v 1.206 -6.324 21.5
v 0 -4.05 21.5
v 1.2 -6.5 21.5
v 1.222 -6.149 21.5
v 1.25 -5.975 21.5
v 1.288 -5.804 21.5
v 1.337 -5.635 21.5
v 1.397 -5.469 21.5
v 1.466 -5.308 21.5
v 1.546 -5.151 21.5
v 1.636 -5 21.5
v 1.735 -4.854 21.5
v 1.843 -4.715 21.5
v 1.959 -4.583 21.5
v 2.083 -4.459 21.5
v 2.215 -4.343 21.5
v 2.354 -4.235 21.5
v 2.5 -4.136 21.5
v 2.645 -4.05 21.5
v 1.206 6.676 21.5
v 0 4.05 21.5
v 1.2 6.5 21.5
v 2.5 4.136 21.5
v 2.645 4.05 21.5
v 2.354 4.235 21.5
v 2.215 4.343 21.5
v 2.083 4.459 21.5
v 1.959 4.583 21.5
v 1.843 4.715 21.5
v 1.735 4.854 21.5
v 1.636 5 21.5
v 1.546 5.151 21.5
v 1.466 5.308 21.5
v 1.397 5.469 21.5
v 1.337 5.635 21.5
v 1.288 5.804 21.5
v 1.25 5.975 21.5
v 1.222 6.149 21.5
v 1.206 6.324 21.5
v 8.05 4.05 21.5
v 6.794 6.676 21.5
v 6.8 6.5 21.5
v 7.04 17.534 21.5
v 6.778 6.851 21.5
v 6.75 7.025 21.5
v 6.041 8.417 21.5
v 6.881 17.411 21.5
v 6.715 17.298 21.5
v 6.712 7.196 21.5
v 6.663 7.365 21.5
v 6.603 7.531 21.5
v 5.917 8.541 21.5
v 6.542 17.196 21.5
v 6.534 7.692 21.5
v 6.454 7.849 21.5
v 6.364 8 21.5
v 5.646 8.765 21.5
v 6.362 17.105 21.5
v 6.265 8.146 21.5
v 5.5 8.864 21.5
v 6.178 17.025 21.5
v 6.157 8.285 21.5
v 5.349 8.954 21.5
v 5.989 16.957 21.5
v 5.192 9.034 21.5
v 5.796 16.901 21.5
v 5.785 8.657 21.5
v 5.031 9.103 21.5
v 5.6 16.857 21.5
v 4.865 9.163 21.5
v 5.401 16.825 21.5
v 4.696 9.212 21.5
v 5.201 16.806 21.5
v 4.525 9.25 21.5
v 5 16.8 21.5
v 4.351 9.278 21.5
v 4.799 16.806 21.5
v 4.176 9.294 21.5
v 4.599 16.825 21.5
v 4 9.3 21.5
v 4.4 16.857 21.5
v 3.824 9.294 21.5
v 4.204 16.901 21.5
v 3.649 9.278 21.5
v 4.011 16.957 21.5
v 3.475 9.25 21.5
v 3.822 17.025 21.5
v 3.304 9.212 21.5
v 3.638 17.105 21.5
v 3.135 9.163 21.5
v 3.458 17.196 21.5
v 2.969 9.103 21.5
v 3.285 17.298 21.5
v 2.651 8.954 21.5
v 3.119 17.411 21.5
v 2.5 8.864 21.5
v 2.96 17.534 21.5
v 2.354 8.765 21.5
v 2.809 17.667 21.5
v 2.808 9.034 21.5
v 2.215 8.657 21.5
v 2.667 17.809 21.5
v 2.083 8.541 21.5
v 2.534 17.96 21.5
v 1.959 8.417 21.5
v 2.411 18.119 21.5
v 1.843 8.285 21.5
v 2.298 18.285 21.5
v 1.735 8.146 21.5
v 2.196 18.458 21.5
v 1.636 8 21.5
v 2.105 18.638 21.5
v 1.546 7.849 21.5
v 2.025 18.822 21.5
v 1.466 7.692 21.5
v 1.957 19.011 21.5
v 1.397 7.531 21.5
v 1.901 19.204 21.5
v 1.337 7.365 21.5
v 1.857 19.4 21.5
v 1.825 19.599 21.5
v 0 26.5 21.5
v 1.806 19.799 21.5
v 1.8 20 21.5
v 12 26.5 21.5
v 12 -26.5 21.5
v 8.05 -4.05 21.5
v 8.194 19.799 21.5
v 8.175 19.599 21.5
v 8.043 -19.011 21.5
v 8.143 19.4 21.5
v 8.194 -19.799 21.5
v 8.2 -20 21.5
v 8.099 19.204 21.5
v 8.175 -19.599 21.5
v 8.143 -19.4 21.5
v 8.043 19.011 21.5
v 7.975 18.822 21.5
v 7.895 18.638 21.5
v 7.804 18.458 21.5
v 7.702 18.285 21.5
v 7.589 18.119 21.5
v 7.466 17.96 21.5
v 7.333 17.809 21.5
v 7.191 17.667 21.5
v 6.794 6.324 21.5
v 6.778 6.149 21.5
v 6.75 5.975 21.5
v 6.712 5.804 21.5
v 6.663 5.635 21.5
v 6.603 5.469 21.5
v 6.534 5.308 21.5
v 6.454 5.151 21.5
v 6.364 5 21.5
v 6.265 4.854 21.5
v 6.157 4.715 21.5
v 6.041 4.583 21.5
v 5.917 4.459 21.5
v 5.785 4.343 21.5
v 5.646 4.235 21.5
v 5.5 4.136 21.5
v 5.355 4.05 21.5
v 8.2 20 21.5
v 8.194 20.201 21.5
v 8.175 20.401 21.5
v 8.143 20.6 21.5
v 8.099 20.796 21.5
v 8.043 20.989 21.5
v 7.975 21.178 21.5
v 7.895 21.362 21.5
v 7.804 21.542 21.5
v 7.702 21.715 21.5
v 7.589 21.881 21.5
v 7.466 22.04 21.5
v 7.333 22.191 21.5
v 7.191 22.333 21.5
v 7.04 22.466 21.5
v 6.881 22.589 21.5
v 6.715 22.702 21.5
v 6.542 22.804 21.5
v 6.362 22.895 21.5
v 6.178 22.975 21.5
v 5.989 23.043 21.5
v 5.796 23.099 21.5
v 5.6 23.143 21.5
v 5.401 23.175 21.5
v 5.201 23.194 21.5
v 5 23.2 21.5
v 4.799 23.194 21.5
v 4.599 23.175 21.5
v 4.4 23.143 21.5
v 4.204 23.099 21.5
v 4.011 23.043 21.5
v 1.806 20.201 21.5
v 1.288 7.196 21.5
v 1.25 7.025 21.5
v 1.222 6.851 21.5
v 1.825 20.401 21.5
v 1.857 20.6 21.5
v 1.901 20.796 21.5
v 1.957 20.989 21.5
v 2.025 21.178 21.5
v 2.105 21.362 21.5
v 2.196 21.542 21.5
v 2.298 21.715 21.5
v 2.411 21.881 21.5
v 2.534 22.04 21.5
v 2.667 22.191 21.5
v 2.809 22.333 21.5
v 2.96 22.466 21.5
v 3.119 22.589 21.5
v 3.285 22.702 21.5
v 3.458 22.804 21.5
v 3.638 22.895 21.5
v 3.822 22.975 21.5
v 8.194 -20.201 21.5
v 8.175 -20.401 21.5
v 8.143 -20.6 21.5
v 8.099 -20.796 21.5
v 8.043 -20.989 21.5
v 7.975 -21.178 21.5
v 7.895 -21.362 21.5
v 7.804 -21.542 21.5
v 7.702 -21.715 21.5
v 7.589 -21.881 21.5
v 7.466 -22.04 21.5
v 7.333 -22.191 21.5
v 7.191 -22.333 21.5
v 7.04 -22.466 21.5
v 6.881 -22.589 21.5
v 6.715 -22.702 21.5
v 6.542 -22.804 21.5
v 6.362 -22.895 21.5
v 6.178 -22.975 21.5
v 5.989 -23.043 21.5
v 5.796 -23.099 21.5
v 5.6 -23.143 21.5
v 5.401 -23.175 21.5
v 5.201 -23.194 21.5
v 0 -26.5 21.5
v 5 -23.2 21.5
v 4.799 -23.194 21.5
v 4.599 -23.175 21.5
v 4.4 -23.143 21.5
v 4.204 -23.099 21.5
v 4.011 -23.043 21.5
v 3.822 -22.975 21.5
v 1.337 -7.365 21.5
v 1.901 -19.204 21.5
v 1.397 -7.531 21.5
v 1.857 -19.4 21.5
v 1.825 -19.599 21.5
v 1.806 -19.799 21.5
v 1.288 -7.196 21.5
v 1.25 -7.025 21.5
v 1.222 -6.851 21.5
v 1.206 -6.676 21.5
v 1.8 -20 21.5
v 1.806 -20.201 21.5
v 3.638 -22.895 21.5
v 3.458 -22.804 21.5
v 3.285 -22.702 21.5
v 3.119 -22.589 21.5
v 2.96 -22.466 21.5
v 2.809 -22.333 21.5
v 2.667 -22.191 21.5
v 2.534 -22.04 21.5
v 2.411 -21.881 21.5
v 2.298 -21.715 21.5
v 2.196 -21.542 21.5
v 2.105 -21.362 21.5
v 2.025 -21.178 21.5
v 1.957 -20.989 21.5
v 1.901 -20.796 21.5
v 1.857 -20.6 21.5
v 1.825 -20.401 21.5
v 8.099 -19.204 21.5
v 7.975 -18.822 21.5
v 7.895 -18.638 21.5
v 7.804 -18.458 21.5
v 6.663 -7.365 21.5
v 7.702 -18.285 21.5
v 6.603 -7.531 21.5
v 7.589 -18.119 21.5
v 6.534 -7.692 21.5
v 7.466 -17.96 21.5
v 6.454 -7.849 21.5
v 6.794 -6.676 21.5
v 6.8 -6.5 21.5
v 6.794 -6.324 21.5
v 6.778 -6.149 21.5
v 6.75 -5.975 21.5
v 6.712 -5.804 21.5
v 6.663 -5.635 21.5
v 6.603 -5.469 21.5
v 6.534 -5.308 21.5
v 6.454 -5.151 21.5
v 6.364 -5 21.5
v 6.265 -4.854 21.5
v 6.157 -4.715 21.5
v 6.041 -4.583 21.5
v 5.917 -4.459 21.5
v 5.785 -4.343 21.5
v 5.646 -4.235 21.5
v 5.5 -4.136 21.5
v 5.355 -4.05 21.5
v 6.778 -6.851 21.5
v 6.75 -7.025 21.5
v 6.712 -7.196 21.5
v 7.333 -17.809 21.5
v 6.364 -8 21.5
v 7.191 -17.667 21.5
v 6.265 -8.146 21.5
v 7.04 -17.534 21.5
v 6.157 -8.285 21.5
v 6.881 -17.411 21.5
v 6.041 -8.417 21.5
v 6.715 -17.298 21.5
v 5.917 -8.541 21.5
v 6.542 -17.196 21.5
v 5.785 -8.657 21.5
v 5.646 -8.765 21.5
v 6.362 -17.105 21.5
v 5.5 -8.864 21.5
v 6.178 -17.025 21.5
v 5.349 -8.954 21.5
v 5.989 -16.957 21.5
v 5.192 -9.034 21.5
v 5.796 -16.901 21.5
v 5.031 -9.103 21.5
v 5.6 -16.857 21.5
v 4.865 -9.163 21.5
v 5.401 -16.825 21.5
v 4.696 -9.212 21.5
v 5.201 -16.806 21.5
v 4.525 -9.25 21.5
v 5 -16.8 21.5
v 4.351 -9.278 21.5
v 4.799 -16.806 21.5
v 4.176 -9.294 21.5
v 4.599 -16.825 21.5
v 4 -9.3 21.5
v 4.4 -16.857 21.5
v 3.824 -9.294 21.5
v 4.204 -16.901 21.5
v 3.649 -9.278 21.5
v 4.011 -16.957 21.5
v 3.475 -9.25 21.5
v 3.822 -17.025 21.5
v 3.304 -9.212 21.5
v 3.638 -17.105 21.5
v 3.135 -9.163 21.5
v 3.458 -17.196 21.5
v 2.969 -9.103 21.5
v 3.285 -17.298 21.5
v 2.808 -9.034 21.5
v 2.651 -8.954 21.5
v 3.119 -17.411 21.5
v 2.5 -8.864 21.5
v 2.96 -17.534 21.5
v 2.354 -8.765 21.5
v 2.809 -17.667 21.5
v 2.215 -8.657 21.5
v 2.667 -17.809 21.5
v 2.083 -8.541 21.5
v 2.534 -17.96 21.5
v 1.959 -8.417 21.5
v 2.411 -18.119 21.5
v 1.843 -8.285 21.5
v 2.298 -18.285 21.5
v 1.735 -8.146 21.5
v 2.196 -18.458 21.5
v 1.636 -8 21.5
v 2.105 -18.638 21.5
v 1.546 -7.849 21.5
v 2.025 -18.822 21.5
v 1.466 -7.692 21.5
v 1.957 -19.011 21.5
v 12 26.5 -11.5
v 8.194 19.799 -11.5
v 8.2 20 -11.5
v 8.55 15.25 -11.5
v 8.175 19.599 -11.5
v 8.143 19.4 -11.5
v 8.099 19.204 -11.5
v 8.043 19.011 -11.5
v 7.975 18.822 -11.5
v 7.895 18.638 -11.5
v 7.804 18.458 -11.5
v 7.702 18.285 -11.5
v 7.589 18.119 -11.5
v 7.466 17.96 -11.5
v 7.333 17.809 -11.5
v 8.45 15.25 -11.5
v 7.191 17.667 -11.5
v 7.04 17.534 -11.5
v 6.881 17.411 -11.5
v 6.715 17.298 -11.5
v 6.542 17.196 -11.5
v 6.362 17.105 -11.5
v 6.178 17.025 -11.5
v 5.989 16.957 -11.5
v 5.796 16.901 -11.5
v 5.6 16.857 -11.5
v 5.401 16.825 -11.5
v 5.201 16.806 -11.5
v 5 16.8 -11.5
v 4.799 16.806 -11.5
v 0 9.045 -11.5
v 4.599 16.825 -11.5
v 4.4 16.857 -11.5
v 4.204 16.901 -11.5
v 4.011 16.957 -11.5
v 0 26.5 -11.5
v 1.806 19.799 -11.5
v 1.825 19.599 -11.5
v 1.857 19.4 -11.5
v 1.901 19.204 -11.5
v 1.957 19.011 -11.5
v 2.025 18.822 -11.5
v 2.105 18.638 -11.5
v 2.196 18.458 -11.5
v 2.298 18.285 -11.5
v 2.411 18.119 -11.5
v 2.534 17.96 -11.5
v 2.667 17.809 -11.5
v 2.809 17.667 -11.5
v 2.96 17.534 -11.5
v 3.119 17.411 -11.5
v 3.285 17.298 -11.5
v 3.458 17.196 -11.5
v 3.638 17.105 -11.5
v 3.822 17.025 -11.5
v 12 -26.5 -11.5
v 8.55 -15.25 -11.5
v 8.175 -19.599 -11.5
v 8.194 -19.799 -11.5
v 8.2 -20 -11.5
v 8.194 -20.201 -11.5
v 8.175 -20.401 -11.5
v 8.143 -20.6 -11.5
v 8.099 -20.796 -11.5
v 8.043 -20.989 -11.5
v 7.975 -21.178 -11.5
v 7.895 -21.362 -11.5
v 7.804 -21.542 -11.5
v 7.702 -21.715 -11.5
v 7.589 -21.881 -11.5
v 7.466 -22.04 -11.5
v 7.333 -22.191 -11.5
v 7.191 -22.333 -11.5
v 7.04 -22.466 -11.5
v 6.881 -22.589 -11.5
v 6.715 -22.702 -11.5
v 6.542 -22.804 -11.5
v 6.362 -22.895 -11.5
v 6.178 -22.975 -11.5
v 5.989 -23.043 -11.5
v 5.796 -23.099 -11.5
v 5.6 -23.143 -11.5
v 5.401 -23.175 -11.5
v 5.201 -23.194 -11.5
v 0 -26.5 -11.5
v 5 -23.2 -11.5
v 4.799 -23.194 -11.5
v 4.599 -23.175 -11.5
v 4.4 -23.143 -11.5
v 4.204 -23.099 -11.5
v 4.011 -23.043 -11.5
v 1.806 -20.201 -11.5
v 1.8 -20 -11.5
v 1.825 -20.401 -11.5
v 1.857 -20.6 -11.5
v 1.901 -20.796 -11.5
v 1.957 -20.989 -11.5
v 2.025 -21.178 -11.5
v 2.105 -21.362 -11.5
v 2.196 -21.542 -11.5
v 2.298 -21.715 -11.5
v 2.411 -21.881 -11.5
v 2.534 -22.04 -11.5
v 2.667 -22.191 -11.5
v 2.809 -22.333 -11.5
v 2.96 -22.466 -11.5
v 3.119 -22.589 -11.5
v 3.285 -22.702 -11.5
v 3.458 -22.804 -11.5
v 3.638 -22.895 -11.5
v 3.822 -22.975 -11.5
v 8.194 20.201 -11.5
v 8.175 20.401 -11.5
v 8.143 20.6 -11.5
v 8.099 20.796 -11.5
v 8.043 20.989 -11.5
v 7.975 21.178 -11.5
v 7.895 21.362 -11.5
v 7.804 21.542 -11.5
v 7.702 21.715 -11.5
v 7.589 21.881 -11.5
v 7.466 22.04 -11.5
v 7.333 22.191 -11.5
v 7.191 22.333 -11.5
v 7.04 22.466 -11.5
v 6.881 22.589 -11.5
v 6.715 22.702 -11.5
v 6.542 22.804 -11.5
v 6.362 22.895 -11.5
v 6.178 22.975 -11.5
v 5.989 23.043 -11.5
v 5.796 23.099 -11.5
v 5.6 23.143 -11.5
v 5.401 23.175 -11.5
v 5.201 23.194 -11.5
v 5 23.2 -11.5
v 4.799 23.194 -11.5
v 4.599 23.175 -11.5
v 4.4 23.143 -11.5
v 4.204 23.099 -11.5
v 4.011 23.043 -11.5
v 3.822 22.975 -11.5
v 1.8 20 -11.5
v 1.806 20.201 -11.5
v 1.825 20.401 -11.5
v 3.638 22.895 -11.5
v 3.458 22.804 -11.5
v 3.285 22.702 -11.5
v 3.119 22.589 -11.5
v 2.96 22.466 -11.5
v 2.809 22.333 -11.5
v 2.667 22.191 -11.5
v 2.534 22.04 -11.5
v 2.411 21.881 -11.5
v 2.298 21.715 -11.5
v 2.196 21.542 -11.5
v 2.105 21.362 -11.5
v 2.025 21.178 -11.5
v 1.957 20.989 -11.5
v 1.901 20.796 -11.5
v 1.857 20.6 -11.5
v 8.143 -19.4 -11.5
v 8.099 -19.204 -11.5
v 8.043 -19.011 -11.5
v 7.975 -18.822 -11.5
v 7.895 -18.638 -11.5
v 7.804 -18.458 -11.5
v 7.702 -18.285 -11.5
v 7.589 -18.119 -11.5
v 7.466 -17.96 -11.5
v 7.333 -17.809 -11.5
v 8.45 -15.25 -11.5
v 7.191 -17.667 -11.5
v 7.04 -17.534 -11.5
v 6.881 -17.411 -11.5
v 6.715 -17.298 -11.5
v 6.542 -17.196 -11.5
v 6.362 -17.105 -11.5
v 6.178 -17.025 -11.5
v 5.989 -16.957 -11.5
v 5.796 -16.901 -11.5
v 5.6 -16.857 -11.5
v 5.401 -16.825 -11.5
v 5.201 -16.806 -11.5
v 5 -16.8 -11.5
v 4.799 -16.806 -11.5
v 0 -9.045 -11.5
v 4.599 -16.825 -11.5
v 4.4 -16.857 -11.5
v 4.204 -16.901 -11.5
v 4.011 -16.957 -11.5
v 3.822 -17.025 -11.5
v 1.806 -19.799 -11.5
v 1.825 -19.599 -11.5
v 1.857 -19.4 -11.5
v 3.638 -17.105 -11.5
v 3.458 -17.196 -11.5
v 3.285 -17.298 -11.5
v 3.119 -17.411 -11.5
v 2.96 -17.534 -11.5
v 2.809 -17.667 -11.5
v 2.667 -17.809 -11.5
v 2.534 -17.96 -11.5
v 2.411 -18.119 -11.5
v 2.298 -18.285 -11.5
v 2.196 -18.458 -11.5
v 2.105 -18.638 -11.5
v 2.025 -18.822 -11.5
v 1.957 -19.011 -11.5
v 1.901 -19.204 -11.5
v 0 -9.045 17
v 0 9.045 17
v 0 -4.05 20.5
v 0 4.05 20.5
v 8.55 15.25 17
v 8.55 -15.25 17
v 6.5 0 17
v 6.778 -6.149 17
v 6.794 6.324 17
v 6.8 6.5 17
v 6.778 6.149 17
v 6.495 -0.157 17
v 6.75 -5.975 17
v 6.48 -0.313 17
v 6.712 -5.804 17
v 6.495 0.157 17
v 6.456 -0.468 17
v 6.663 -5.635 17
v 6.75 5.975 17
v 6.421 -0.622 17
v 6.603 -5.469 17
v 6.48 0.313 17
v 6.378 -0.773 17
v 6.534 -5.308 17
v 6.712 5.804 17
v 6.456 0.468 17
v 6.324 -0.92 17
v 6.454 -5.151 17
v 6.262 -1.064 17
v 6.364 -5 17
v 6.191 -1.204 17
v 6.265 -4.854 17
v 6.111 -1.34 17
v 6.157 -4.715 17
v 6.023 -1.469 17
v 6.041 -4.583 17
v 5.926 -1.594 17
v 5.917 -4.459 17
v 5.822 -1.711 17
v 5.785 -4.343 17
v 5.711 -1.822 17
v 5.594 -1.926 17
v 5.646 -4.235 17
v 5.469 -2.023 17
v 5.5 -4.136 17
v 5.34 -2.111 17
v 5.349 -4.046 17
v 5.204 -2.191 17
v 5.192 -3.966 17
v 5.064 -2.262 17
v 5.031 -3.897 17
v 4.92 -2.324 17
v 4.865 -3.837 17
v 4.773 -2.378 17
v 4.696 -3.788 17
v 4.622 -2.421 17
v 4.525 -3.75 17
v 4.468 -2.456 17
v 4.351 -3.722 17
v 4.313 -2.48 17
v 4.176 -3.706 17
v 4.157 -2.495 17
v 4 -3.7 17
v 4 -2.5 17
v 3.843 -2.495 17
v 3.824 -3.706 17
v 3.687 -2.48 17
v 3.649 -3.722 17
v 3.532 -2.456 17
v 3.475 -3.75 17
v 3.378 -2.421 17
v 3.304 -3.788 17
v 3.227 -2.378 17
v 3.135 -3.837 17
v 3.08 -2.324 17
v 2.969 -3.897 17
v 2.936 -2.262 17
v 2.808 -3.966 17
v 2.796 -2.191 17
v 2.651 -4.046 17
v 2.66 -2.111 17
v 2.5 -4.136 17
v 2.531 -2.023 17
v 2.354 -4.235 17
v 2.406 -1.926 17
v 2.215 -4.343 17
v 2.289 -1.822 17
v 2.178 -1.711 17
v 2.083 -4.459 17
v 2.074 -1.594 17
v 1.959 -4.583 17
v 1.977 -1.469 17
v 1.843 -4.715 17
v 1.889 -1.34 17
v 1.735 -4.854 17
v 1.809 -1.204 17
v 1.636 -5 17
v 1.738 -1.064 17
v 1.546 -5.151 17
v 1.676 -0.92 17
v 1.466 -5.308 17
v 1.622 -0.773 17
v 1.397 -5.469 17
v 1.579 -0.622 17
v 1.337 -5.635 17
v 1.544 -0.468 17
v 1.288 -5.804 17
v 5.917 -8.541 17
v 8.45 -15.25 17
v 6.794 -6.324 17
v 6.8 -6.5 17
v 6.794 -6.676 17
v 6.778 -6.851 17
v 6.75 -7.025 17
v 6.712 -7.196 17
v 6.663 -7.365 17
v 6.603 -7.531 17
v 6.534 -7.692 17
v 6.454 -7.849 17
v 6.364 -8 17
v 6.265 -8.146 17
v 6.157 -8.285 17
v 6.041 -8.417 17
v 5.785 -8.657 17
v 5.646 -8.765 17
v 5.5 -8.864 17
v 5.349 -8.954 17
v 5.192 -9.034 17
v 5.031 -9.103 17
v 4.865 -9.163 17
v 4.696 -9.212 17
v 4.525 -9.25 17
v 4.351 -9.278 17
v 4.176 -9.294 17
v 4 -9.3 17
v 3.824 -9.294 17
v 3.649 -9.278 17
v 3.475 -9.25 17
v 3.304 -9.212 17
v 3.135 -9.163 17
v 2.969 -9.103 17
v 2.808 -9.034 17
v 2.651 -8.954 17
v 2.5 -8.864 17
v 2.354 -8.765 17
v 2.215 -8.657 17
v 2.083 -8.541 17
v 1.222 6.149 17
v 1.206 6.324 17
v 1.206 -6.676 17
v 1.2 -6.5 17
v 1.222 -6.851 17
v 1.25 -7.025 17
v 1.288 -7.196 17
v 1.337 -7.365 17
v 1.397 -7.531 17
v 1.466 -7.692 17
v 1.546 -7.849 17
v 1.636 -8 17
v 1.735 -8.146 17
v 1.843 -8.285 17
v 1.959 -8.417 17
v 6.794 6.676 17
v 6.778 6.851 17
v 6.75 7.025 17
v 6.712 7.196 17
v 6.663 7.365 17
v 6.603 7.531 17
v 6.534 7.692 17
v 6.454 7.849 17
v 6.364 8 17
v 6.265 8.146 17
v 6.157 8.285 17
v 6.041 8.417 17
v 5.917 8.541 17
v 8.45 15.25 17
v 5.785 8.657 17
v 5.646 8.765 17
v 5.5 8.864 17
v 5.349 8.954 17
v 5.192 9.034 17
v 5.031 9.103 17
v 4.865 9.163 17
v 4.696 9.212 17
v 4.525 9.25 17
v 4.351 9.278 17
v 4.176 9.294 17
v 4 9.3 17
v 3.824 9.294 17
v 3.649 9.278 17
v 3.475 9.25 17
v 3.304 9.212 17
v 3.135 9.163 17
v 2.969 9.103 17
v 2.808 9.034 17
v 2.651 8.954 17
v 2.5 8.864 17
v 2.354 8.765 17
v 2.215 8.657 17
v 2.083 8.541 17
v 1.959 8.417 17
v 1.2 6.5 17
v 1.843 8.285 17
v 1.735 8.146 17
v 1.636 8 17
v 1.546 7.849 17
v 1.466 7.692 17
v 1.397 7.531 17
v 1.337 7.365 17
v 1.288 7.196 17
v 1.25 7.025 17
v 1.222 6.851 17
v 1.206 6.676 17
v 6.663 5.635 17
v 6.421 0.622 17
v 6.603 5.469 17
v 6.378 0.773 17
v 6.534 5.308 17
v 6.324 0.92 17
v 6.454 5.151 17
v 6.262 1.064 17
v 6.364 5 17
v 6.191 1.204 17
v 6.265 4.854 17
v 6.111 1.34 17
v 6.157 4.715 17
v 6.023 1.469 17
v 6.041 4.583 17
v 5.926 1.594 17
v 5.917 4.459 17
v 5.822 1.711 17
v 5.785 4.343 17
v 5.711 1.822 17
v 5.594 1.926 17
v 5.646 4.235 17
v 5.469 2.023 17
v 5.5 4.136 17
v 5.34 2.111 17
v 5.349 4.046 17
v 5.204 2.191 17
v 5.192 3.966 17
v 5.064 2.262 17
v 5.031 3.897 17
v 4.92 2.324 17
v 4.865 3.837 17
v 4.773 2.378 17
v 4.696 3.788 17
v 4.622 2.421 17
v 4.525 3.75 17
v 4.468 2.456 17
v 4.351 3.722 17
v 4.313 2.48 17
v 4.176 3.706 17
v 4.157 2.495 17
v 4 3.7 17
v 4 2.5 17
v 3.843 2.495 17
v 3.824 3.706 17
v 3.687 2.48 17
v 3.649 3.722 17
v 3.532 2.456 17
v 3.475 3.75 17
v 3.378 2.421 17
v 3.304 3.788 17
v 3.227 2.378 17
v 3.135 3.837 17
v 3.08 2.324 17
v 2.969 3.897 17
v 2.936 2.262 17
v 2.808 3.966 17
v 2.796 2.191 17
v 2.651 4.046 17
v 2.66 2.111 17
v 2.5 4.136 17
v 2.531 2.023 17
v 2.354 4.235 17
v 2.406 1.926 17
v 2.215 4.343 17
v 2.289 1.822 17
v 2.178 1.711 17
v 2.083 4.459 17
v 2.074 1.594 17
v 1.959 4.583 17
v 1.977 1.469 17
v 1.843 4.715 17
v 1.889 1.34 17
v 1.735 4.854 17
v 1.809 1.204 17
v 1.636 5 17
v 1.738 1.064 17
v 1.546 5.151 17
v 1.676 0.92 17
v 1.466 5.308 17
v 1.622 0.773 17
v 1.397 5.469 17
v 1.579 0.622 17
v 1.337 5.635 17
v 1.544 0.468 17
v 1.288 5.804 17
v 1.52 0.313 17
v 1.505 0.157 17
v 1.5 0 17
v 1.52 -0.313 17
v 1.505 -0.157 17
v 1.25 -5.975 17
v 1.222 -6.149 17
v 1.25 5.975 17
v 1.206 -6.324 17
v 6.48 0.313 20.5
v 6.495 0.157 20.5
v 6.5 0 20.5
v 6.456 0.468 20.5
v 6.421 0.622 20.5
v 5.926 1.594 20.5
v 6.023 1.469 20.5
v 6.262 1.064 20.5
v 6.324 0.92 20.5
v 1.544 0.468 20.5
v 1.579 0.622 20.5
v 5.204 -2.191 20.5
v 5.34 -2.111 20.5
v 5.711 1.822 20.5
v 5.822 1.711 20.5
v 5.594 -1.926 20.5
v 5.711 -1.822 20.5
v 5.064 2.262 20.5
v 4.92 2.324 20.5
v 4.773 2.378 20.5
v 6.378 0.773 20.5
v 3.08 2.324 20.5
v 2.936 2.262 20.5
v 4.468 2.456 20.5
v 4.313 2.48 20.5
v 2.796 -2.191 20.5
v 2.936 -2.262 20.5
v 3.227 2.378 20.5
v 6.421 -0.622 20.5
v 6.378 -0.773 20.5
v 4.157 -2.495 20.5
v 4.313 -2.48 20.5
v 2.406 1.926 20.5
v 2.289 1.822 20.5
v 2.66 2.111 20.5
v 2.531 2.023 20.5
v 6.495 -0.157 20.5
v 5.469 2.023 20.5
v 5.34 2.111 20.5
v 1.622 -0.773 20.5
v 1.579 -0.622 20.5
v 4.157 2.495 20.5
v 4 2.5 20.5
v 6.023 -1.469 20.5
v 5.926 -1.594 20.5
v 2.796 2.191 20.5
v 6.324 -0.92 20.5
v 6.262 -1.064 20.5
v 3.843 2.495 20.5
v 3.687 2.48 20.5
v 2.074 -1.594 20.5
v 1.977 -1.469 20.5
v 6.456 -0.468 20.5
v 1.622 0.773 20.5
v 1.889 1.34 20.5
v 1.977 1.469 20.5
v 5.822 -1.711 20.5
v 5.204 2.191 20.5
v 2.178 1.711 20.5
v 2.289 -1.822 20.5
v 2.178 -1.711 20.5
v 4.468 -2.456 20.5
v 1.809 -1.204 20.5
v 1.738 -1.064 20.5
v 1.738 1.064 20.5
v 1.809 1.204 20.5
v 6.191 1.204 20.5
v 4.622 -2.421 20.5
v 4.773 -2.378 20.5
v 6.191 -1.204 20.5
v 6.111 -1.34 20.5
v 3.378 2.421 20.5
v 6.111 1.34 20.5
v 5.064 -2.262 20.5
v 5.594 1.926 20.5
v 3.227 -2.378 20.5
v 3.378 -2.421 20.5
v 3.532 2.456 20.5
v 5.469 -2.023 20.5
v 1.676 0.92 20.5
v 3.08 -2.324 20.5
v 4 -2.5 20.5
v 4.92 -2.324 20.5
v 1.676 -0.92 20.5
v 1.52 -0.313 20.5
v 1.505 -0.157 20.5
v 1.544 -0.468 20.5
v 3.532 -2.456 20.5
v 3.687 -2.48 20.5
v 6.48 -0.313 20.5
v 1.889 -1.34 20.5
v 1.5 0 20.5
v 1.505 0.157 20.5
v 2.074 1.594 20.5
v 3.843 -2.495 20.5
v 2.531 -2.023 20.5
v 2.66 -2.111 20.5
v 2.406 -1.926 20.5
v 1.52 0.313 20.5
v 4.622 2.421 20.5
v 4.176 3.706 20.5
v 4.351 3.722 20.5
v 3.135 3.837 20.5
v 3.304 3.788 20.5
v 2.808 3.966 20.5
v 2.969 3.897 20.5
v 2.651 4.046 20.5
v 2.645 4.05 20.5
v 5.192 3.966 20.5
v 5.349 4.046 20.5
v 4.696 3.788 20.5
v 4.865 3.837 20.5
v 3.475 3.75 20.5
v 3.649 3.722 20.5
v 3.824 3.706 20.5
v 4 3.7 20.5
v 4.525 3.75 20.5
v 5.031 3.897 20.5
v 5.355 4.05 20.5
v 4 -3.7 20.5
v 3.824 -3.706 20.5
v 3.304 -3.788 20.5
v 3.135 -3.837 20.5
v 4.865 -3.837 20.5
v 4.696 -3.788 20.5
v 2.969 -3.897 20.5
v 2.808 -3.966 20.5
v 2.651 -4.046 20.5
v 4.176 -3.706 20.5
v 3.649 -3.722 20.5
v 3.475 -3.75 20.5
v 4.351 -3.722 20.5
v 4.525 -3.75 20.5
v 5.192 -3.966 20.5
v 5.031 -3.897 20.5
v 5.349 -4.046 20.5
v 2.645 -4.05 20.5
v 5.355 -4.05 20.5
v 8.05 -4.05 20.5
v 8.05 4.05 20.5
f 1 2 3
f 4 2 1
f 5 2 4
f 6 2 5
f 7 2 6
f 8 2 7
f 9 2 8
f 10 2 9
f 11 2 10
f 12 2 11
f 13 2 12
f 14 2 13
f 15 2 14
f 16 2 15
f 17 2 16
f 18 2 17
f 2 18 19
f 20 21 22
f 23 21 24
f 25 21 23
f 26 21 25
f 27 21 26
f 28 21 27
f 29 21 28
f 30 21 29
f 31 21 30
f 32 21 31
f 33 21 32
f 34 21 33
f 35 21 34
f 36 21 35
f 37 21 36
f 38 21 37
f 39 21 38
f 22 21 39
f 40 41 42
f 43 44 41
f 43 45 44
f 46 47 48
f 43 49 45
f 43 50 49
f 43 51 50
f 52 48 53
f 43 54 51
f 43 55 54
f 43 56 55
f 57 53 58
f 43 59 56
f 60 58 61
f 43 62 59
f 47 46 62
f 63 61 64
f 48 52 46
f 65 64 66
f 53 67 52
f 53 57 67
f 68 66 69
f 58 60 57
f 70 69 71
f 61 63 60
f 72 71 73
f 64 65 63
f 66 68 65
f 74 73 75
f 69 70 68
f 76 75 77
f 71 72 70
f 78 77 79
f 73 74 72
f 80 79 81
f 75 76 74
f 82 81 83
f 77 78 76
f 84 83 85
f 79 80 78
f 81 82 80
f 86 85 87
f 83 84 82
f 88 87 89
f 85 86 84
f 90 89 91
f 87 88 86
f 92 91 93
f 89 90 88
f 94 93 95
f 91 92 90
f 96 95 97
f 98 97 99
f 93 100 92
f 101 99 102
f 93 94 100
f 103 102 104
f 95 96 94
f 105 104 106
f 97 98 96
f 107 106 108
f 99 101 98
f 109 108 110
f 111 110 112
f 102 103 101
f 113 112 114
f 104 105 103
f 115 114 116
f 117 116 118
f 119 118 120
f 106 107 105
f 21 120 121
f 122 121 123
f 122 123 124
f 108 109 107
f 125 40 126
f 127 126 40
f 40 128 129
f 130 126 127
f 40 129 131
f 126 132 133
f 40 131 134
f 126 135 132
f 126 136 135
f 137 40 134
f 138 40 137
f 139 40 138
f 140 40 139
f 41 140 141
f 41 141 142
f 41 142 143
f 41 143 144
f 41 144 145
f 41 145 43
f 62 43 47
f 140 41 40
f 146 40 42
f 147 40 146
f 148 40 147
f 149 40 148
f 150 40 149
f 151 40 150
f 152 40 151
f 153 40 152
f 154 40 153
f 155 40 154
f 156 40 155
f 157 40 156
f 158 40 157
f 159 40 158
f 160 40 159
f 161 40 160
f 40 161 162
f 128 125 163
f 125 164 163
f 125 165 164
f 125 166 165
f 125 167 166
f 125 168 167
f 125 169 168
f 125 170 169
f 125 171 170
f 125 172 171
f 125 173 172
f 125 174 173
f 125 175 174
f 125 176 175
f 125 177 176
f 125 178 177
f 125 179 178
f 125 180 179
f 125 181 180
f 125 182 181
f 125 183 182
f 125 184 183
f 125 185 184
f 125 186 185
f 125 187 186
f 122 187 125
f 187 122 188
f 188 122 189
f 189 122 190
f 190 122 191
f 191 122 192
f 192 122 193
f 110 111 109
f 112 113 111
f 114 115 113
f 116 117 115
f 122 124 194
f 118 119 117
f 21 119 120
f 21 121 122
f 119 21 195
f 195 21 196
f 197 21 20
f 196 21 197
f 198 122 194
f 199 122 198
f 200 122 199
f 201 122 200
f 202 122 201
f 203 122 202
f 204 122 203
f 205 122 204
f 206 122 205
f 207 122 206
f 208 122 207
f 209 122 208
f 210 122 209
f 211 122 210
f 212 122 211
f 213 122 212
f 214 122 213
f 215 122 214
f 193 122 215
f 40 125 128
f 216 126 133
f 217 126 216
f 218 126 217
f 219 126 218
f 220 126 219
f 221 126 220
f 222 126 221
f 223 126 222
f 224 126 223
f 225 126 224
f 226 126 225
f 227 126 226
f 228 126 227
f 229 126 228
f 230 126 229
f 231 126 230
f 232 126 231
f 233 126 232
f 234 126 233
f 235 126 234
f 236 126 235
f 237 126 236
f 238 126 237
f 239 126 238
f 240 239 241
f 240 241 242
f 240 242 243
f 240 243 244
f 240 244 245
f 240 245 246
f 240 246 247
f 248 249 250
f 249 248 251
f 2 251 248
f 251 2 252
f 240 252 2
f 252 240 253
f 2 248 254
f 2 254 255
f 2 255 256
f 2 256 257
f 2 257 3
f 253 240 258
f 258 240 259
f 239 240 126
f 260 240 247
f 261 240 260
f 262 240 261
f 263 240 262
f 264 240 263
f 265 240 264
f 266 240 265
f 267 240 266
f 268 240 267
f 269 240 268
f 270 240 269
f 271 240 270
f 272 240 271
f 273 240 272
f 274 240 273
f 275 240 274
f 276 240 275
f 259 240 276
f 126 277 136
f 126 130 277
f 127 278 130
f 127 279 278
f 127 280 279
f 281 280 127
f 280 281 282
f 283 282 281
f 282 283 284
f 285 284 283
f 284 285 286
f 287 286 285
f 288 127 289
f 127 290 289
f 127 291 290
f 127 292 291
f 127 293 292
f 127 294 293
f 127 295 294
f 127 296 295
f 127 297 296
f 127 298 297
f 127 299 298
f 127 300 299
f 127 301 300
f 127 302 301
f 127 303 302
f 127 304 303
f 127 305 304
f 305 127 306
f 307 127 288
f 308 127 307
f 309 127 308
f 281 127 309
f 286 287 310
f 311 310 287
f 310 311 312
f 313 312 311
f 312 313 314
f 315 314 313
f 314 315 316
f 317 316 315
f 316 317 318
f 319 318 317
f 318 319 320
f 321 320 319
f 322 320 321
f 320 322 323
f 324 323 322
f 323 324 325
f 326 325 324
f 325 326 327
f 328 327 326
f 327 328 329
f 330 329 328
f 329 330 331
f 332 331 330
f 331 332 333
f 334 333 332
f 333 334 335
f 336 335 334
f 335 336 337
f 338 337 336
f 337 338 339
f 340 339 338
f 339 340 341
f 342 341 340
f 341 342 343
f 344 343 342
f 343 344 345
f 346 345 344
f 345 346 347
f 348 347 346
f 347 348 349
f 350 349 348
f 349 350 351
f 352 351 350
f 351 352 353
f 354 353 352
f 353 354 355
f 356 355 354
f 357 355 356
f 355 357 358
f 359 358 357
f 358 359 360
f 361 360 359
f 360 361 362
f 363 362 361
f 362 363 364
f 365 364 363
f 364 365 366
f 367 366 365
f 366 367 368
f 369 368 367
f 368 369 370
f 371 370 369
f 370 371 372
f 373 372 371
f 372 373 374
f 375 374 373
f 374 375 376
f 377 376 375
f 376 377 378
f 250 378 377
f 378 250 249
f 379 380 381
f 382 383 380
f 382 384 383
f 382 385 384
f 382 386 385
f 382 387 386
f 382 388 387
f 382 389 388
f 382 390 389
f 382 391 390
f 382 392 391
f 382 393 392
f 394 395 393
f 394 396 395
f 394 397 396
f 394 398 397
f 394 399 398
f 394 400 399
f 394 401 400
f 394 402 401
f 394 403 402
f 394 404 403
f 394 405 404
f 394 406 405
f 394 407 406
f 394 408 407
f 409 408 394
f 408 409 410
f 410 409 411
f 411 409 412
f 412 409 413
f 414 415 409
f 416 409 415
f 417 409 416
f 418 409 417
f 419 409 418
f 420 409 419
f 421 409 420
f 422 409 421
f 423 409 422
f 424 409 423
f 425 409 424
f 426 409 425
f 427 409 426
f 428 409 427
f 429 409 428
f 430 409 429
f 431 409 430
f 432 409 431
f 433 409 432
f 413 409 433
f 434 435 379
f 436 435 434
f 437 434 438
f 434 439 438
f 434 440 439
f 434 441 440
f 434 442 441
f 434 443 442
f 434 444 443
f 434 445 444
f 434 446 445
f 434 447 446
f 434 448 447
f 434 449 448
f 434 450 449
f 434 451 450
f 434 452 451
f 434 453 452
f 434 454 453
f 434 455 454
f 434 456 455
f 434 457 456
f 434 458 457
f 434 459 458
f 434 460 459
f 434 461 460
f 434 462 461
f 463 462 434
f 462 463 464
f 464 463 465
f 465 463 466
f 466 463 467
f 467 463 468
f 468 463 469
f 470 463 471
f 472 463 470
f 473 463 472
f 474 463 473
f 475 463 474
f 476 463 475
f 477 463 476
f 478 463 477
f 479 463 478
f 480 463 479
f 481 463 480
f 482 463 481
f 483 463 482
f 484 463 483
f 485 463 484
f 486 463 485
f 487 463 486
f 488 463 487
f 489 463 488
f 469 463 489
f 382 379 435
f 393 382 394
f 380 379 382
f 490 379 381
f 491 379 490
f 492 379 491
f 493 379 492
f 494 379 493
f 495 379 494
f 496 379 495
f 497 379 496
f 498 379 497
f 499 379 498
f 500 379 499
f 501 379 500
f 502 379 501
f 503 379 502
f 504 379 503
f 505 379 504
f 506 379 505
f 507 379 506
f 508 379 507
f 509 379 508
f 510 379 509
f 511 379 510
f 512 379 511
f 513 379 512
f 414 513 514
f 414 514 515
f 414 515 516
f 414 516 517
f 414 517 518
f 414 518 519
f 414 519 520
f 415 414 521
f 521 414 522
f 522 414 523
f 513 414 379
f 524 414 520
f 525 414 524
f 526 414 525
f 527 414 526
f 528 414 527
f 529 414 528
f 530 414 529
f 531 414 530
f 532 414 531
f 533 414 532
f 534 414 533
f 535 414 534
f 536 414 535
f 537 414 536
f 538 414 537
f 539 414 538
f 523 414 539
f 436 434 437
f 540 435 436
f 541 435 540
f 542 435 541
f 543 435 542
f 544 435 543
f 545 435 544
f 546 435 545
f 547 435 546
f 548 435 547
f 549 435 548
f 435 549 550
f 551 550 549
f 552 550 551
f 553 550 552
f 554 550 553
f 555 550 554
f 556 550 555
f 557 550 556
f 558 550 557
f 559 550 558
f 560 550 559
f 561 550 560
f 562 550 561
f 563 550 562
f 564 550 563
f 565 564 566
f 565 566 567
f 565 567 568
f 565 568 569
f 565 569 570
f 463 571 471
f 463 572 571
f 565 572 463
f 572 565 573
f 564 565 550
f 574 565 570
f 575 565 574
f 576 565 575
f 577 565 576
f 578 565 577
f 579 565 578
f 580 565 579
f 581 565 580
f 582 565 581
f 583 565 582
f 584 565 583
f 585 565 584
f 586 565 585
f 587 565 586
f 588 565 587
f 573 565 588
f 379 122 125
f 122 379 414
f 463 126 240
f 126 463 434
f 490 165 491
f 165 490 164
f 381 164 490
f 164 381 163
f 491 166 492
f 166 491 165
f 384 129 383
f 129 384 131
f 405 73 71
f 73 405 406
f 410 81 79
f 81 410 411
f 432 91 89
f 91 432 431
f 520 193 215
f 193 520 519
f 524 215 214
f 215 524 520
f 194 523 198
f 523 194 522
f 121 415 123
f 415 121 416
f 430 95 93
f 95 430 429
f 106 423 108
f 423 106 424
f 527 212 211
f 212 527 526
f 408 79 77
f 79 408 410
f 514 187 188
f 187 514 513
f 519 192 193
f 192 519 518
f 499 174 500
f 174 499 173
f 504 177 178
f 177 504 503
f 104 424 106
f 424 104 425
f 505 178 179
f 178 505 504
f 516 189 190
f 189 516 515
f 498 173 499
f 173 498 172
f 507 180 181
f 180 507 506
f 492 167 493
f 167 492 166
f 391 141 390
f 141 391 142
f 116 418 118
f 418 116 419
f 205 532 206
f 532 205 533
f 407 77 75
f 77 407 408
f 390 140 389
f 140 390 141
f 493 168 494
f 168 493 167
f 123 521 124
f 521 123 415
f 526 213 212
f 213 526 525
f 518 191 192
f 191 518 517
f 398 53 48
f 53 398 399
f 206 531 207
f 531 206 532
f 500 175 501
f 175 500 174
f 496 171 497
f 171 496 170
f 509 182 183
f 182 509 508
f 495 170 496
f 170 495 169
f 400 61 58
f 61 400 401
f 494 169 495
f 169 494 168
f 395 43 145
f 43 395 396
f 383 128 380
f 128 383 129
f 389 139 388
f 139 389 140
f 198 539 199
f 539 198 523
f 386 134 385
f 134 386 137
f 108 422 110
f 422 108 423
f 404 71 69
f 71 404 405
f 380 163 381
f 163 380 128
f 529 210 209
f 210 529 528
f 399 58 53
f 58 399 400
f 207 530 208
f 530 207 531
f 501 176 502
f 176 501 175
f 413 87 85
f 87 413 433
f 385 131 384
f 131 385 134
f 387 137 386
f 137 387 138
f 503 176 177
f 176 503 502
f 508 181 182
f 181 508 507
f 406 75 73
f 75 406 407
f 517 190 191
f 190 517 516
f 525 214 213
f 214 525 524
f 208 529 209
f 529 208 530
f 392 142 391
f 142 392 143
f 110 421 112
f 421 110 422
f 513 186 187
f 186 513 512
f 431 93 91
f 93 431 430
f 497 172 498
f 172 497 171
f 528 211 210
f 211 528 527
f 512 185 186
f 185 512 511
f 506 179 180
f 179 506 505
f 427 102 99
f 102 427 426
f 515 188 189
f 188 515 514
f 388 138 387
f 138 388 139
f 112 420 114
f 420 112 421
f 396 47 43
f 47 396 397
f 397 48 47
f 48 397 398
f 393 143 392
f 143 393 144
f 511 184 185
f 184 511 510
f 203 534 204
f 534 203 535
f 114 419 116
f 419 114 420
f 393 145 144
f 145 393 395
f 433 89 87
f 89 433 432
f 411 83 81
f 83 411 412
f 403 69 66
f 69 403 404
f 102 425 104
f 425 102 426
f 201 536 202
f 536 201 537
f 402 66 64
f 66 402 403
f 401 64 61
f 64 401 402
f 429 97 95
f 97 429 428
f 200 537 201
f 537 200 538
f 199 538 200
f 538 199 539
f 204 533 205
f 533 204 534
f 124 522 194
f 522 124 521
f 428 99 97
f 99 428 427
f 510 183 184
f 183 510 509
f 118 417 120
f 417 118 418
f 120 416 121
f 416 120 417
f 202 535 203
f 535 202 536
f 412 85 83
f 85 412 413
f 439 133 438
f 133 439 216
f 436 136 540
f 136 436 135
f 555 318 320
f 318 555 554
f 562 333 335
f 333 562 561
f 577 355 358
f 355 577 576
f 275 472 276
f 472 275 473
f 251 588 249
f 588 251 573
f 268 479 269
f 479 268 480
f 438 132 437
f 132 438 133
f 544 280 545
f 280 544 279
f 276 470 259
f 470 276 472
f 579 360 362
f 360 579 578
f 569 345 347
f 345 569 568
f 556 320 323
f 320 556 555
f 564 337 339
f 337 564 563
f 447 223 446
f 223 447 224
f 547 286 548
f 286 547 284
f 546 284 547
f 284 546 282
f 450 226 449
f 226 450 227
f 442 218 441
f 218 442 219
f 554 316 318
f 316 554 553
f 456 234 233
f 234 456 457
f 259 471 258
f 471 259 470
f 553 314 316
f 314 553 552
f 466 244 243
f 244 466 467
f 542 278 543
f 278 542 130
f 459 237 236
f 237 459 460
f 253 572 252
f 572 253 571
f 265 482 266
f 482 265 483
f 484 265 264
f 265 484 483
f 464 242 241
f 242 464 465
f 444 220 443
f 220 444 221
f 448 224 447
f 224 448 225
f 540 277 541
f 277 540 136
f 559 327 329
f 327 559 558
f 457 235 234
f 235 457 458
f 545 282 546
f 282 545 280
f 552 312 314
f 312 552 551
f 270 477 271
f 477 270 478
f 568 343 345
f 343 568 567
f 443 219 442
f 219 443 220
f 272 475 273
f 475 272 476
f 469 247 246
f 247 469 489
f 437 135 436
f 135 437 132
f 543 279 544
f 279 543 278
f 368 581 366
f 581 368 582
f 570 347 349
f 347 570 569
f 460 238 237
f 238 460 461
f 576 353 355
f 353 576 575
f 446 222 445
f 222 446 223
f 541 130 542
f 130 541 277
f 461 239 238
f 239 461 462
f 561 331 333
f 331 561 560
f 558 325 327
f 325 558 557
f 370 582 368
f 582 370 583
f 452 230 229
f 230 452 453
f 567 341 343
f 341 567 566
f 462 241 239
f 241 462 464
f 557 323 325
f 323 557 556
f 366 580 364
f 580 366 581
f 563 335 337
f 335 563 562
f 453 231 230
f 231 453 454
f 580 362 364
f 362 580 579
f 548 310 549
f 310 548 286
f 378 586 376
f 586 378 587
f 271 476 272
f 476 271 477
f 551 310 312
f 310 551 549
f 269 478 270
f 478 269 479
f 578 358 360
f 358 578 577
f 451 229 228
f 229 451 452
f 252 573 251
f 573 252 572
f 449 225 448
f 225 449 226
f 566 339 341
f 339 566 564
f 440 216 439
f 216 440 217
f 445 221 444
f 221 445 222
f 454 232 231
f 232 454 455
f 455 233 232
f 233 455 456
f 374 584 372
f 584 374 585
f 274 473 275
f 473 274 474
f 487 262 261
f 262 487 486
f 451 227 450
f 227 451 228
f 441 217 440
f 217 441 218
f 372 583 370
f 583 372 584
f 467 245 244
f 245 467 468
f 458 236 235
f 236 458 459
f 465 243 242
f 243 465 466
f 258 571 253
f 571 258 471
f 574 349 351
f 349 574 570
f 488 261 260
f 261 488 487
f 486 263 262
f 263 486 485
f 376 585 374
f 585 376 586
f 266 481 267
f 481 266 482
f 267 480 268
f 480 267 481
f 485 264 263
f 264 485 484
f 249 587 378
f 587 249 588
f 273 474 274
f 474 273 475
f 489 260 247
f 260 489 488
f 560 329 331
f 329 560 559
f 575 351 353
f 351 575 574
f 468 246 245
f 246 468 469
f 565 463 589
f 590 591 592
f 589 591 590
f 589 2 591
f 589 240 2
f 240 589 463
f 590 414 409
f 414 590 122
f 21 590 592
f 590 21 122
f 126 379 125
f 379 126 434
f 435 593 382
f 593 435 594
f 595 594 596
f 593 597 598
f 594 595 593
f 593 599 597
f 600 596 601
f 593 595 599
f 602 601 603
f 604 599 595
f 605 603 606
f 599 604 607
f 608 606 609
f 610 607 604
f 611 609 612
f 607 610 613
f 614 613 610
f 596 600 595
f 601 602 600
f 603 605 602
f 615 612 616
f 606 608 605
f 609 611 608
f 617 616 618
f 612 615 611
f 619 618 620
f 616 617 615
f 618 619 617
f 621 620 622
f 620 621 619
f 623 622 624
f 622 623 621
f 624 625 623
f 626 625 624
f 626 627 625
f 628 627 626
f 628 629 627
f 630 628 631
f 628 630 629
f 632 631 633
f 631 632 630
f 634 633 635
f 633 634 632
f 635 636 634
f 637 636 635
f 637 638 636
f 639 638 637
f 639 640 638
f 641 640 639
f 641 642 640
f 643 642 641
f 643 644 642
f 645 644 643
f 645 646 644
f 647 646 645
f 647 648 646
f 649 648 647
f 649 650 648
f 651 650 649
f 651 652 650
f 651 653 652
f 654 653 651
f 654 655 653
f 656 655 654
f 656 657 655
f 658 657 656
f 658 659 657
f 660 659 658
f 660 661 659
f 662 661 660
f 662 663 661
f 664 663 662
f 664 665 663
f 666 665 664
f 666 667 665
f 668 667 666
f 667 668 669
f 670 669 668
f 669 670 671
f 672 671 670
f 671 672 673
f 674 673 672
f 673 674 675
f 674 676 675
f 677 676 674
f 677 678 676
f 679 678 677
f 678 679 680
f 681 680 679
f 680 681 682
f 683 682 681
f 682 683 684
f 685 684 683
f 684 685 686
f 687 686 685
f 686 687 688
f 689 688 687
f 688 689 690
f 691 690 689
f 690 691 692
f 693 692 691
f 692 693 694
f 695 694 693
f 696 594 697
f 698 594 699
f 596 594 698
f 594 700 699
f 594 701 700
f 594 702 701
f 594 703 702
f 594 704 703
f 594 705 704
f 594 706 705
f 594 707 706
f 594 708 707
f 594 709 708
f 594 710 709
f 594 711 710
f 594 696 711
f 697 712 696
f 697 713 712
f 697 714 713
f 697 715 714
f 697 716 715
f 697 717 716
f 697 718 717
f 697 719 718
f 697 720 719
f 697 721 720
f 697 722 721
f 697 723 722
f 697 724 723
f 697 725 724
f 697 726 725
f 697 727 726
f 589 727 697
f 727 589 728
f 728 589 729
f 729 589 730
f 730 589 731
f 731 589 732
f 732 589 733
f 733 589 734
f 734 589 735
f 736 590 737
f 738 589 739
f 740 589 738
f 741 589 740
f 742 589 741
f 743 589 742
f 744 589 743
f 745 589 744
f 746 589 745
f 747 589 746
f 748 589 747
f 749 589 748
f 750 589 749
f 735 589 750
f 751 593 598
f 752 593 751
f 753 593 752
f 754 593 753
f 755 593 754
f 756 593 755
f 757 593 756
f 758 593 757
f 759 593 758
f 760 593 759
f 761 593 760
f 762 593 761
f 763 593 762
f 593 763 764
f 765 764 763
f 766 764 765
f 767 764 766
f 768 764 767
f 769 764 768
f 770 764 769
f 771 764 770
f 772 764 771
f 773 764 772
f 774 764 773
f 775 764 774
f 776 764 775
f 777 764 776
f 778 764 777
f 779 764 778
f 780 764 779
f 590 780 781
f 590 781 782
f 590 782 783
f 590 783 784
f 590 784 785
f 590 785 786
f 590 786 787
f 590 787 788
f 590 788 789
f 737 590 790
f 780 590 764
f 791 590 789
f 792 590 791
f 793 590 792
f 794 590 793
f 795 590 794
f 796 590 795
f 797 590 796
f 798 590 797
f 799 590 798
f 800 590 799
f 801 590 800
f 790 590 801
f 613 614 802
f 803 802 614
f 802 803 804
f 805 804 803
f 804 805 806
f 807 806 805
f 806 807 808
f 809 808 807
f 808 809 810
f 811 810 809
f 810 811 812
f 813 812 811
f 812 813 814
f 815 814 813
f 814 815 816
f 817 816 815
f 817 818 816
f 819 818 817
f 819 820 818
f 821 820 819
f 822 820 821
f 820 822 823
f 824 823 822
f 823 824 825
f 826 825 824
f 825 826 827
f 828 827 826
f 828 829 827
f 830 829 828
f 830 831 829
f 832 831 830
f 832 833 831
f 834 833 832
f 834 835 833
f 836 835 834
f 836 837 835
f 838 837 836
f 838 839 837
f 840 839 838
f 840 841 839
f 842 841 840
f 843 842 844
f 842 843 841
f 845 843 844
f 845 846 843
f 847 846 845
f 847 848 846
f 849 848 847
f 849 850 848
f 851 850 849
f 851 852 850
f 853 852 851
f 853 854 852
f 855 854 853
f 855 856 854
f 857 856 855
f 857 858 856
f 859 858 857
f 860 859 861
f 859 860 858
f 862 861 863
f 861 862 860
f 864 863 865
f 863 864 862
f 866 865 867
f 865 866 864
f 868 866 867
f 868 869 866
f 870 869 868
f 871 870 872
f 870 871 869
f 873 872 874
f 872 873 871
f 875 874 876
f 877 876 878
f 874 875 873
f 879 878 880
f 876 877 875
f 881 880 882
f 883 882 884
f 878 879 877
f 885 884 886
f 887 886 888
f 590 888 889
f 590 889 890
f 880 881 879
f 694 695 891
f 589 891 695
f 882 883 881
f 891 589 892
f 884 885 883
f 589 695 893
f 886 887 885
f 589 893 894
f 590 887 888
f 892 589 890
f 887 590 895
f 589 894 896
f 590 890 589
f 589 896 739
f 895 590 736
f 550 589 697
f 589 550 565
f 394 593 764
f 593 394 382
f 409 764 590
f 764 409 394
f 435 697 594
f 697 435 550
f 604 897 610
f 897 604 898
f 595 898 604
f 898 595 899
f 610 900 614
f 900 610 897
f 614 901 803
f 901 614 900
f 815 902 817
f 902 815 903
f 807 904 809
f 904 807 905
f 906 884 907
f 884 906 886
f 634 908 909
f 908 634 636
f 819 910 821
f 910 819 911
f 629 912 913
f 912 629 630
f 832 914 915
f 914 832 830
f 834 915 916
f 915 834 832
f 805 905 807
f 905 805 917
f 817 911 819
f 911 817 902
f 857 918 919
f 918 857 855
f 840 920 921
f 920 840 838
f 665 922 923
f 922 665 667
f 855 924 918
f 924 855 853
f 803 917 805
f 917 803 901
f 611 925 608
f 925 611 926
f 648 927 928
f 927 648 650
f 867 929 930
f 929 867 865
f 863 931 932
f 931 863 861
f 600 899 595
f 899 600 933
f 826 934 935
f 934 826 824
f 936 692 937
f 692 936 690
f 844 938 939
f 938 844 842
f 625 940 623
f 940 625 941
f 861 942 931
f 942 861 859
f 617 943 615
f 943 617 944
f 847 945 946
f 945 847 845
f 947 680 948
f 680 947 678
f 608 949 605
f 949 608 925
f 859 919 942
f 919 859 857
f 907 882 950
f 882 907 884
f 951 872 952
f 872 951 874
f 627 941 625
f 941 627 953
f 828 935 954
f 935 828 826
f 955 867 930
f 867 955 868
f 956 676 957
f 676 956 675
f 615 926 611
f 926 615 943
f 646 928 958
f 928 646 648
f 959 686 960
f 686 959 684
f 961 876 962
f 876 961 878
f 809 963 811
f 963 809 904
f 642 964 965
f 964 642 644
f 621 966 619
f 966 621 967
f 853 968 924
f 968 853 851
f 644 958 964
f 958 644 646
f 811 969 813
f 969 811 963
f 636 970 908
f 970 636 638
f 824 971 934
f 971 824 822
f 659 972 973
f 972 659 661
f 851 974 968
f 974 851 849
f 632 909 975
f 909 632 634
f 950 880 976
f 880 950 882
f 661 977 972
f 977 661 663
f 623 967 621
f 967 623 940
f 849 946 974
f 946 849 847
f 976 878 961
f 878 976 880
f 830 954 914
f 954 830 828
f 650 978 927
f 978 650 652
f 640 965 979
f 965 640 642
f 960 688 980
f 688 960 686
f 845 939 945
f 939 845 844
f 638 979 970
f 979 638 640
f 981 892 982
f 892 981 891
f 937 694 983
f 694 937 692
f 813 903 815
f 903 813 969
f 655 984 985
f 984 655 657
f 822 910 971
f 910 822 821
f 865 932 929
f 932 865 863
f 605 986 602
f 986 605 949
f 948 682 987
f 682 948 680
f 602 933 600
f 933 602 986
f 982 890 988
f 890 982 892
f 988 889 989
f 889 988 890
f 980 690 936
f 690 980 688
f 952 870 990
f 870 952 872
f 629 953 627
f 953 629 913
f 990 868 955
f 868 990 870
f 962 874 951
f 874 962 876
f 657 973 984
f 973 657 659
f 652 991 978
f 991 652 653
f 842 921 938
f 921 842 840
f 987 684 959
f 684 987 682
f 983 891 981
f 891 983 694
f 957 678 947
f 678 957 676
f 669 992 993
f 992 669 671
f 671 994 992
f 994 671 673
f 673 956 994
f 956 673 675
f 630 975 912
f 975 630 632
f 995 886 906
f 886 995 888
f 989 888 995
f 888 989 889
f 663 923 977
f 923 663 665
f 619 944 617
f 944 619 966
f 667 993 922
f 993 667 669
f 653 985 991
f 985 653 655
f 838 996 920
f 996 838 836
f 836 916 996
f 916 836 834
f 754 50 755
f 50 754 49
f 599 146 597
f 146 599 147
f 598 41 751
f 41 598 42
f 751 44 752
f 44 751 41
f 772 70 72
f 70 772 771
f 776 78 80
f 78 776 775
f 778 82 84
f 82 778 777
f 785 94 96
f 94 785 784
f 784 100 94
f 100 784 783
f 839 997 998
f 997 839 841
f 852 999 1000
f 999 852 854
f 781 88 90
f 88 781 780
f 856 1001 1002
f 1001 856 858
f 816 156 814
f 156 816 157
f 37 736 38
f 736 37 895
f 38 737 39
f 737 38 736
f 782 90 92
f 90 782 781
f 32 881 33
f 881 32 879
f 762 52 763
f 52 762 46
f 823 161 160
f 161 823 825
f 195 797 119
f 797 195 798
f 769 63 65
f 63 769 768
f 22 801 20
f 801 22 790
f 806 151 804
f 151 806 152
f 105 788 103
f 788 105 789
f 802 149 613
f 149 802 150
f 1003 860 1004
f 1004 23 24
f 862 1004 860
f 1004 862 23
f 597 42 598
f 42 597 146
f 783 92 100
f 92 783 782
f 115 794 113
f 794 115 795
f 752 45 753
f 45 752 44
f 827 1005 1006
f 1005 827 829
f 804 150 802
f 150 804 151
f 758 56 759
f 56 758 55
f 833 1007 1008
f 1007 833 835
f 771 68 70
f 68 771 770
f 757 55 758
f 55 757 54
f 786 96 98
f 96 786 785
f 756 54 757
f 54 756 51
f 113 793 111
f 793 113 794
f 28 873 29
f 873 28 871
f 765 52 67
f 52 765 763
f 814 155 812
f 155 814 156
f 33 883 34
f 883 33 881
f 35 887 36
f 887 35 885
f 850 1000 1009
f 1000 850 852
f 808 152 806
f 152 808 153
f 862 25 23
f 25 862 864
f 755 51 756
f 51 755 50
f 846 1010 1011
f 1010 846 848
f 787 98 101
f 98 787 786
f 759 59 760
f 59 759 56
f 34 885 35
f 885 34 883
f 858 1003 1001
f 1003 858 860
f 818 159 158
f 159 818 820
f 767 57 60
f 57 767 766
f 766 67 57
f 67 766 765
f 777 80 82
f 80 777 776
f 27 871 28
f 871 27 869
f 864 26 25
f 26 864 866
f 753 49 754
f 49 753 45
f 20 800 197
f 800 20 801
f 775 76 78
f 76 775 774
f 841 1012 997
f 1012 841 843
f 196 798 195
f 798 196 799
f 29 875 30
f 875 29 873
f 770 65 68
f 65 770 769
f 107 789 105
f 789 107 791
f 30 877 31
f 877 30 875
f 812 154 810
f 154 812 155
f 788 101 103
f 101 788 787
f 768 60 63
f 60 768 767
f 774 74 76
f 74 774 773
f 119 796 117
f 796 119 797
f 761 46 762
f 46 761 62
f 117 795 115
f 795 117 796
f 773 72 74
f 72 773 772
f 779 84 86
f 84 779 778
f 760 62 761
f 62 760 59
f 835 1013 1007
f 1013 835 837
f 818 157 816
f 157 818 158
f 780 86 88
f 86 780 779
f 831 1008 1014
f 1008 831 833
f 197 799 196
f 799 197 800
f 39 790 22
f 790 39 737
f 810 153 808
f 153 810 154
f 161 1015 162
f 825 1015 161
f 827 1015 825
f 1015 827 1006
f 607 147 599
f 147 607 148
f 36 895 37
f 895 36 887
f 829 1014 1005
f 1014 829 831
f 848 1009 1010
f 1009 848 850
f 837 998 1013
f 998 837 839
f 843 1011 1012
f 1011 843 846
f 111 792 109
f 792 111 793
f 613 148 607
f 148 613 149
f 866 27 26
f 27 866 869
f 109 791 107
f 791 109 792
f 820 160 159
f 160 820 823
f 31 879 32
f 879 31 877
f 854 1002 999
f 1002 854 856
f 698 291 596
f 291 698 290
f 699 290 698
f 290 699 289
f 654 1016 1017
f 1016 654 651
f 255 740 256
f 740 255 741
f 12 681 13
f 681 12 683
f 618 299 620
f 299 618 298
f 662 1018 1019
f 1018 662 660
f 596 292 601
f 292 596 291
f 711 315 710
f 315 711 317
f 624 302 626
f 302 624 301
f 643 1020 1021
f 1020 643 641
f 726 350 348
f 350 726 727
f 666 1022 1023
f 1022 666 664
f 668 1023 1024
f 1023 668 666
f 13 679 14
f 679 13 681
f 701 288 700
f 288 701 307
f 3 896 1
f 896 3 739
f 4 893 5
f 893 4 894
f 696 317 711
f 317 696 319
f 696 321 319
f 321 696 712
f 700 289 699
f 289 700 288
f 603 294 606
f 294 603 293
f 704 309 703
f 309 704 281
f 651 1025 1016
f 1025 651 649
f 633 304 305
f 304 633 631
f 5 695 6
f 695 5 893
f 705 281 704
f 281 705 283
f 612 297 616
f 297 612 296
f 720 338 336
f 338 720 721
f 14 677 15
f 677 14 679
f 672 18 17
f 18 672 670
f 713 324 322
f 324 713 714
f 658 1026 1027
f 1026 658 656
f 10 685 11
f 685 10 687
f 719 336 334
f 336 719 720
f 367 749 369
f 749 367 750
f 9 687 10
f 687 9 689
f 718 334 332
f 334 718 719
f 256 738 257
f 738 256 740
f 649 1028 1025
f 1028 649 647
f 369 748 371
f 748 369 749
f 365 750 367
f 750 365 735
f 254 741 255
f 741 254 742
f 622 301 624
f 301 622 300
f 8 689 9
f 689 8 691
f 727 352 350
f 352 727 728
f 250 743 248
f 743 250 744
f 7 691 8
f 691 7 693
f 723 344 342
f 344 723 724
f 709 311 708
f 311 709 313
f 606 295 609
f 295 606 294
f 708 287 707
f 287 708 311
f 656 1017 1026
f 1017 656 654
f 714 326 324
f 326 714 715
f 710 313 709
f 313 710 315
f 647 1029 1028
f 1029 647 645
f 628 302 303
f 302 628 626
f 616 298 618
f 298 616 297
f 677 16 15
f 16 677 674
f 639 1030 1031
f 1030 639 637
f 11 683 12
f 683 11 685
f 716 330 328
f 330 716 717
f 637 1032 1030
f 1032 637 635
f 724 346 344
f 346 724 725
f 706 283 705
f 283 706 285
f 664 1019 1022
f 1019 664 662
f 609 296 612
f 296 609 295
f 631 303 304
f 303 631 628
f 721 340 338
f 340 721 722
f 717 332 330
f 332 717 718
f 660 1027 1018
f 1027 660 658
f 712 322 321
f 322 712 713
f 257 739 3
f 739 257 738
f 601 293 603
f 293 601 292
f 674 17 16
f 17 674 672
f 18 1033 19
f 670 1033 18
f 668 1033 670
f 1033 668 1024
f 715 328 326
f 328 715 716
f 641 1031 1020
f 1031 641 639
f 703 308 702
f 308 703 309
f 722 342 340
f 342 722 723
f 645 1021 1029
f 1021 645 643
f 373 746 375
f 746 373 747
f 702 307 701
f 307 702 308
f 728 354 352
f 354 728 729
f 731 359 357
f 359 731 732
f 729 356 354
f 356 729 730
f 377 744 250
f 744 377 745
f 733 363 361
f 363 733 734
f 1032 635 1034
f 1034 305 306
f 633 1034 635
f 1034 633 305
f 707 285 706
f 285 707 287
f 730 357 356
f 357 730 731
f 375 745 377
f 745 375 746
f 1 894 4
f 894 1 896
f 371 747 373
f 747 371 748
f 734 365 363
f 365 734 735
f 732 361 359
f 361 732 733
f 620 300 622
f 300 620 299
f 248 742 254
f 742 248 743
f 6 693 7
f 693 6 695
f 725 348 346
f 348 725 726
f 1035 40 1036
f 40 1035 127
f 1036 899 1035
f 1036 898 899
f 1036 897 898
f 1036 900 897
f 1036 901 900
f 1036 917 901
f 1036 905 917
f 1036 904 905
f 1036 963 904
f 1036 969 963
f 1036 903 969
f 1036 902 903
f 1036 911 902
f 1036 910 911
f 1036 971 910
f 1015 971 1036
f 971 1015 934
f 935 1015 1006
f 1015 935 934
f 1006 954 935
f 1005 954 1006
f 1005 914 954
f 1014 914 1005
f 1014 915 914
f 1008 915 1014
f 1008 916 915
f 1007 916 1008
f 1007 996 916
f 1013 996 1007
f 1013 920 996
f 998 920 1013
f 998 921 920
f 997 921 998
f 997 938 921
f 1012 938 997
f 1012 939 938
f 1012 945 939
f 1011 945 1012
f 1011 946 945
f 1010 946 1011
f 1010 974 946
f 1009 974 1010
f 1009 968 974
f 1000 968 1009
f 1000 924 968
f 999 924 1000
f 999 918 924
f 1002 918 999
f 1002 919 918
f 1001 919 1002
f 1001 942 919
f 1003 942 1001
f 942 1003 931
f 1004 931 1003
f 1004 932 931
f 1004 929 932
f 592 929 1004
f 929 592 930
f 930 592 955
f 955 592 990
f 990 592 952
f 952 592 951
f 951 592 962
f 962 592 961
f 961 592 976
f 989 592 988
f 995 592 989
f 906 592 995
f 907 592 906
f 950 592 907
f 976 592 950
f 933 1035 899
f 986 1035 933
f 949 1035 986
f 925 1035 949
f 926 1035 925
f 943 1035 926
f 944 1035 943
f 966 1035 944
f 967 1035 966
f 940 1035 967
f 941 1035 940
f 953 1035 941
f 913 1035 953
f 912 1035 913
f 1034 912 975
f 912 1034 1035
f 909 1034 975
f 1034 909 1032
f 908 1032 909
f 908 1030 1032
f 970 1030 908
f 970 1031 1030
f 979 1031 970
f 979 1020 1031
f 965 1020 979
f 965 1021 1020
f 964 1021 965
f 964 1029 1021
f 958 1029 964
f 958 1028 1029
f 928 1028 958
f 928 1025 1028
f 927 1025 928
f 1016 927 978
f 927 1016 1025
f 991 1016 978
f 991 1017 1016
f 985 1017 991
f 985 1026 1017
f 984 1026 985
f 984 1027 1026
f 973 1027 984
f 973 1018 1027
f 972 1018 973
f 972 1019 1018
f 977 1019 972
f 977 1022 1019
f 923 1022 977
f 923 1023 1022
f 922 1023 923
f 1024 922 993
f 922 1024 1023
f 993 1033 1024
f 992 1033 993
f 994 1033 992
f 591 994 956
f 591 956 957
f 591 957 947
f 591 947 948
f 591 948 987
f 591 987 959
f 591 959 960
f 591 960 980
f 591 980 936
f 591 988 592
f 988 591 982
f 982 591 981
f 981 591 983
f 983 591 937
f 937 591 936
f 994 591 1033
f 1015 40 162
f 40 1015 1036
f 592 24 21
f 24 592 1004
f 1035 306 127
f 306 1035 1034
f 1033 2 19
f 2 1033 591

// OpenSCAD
/*

Part of the translation stage for the Raspberry Pi camera, together with camera_mount.scad

Design by Tomas Aidukas, modified by Victor Lovic

*/

// angle is tan(delta_h/slider_hole_w_h)

function mounting_holes_separation() = 40;

module MountHolder() {
  //I have changed these values to give a bigger margin
  slider_hole_w_h = 30.4; 
  slider_x_shift_h = 10.5;
  slider_z_shift_h = -8;
  delta_h = -20.7;
  $fn = 100;
  height = 33;

  // Main Block with mount holes
  difference(){
      
      translate([0,0,5]){
          cube([40.6,53,height],center=true);   
      }
      
      translate([7,mounting_holes_separation()/2,0]){
          //Hole diameter for the mount is 6.4mm
          cylinder(d=6.4,h=200,center=true);
      }
      
      translate([7,-mounting_holes_separation()/2,0]){
          //Hole diameter for the mount is 6.4mm, 30mm apart
          cylinder(d=6.4,h=200,center=true);
      }
      
      // Large block chop
      translate([-18,0,-10]){
          cube([40,70,80], center=true);
      }
      
      //second chop
      translate([34,0,-10]) cube([40,70,80],center=true);

  // Slider Hole
  hull(){
      translate([slider_x_shift_h,slider_hole_w_h/2,slider_z_shift_h]){
          cube([0.1,0.1,50], center=true);
      }
      
      translate([slider_x_shift_h,-slider_hole_w_h/2,slider_z_shift_h]){
          cube([0.1,0.1,50], center=true);
      }
      
      translate([slider_x_shift_h+delta_h,0,slider_z_shift_h]){
          cube([0.1,0.1,50], center=true);
      }
  }// Slider hole ENDS

  /*
      // Stabilizer
      #translate([5,16.5,-10]){
          cube([10,1,50],center=true);
      }
      #translate([5,13,14.5]){
          cube([10,8,1],center=true);
      }// stabilizer END
  */
      
      //Bushing
      translate([6,0,14.5]){
          cylinder(d=5,h=200,center=true);}
      //Bushing END
      
      // Spring Holes
      translate([6,6.5,14.5]){
          cylinder(d=5.6,h=200,center=true);}
      translate([6,-6.5,14.5]){
          cylinder(d=5.6,h=200,center=true);}// Spring Holes END
          
      //Groove for spring holder
      translate([6,0,21.5]){
          //cube([2.5,30,2],center=true);  
          cube([8.1,8.1,2], center=true);
      }
  }

  /*
  // Spring holder
      translate([5.5,3,+height/2+3]){
          cube([1,7,2]);}
          
      translate([5.5,-10,+height/2+3]){
          cube([1,7,2]);}// Spring holder END
  */
}

translate([-2,0,0]) MountHolder();
